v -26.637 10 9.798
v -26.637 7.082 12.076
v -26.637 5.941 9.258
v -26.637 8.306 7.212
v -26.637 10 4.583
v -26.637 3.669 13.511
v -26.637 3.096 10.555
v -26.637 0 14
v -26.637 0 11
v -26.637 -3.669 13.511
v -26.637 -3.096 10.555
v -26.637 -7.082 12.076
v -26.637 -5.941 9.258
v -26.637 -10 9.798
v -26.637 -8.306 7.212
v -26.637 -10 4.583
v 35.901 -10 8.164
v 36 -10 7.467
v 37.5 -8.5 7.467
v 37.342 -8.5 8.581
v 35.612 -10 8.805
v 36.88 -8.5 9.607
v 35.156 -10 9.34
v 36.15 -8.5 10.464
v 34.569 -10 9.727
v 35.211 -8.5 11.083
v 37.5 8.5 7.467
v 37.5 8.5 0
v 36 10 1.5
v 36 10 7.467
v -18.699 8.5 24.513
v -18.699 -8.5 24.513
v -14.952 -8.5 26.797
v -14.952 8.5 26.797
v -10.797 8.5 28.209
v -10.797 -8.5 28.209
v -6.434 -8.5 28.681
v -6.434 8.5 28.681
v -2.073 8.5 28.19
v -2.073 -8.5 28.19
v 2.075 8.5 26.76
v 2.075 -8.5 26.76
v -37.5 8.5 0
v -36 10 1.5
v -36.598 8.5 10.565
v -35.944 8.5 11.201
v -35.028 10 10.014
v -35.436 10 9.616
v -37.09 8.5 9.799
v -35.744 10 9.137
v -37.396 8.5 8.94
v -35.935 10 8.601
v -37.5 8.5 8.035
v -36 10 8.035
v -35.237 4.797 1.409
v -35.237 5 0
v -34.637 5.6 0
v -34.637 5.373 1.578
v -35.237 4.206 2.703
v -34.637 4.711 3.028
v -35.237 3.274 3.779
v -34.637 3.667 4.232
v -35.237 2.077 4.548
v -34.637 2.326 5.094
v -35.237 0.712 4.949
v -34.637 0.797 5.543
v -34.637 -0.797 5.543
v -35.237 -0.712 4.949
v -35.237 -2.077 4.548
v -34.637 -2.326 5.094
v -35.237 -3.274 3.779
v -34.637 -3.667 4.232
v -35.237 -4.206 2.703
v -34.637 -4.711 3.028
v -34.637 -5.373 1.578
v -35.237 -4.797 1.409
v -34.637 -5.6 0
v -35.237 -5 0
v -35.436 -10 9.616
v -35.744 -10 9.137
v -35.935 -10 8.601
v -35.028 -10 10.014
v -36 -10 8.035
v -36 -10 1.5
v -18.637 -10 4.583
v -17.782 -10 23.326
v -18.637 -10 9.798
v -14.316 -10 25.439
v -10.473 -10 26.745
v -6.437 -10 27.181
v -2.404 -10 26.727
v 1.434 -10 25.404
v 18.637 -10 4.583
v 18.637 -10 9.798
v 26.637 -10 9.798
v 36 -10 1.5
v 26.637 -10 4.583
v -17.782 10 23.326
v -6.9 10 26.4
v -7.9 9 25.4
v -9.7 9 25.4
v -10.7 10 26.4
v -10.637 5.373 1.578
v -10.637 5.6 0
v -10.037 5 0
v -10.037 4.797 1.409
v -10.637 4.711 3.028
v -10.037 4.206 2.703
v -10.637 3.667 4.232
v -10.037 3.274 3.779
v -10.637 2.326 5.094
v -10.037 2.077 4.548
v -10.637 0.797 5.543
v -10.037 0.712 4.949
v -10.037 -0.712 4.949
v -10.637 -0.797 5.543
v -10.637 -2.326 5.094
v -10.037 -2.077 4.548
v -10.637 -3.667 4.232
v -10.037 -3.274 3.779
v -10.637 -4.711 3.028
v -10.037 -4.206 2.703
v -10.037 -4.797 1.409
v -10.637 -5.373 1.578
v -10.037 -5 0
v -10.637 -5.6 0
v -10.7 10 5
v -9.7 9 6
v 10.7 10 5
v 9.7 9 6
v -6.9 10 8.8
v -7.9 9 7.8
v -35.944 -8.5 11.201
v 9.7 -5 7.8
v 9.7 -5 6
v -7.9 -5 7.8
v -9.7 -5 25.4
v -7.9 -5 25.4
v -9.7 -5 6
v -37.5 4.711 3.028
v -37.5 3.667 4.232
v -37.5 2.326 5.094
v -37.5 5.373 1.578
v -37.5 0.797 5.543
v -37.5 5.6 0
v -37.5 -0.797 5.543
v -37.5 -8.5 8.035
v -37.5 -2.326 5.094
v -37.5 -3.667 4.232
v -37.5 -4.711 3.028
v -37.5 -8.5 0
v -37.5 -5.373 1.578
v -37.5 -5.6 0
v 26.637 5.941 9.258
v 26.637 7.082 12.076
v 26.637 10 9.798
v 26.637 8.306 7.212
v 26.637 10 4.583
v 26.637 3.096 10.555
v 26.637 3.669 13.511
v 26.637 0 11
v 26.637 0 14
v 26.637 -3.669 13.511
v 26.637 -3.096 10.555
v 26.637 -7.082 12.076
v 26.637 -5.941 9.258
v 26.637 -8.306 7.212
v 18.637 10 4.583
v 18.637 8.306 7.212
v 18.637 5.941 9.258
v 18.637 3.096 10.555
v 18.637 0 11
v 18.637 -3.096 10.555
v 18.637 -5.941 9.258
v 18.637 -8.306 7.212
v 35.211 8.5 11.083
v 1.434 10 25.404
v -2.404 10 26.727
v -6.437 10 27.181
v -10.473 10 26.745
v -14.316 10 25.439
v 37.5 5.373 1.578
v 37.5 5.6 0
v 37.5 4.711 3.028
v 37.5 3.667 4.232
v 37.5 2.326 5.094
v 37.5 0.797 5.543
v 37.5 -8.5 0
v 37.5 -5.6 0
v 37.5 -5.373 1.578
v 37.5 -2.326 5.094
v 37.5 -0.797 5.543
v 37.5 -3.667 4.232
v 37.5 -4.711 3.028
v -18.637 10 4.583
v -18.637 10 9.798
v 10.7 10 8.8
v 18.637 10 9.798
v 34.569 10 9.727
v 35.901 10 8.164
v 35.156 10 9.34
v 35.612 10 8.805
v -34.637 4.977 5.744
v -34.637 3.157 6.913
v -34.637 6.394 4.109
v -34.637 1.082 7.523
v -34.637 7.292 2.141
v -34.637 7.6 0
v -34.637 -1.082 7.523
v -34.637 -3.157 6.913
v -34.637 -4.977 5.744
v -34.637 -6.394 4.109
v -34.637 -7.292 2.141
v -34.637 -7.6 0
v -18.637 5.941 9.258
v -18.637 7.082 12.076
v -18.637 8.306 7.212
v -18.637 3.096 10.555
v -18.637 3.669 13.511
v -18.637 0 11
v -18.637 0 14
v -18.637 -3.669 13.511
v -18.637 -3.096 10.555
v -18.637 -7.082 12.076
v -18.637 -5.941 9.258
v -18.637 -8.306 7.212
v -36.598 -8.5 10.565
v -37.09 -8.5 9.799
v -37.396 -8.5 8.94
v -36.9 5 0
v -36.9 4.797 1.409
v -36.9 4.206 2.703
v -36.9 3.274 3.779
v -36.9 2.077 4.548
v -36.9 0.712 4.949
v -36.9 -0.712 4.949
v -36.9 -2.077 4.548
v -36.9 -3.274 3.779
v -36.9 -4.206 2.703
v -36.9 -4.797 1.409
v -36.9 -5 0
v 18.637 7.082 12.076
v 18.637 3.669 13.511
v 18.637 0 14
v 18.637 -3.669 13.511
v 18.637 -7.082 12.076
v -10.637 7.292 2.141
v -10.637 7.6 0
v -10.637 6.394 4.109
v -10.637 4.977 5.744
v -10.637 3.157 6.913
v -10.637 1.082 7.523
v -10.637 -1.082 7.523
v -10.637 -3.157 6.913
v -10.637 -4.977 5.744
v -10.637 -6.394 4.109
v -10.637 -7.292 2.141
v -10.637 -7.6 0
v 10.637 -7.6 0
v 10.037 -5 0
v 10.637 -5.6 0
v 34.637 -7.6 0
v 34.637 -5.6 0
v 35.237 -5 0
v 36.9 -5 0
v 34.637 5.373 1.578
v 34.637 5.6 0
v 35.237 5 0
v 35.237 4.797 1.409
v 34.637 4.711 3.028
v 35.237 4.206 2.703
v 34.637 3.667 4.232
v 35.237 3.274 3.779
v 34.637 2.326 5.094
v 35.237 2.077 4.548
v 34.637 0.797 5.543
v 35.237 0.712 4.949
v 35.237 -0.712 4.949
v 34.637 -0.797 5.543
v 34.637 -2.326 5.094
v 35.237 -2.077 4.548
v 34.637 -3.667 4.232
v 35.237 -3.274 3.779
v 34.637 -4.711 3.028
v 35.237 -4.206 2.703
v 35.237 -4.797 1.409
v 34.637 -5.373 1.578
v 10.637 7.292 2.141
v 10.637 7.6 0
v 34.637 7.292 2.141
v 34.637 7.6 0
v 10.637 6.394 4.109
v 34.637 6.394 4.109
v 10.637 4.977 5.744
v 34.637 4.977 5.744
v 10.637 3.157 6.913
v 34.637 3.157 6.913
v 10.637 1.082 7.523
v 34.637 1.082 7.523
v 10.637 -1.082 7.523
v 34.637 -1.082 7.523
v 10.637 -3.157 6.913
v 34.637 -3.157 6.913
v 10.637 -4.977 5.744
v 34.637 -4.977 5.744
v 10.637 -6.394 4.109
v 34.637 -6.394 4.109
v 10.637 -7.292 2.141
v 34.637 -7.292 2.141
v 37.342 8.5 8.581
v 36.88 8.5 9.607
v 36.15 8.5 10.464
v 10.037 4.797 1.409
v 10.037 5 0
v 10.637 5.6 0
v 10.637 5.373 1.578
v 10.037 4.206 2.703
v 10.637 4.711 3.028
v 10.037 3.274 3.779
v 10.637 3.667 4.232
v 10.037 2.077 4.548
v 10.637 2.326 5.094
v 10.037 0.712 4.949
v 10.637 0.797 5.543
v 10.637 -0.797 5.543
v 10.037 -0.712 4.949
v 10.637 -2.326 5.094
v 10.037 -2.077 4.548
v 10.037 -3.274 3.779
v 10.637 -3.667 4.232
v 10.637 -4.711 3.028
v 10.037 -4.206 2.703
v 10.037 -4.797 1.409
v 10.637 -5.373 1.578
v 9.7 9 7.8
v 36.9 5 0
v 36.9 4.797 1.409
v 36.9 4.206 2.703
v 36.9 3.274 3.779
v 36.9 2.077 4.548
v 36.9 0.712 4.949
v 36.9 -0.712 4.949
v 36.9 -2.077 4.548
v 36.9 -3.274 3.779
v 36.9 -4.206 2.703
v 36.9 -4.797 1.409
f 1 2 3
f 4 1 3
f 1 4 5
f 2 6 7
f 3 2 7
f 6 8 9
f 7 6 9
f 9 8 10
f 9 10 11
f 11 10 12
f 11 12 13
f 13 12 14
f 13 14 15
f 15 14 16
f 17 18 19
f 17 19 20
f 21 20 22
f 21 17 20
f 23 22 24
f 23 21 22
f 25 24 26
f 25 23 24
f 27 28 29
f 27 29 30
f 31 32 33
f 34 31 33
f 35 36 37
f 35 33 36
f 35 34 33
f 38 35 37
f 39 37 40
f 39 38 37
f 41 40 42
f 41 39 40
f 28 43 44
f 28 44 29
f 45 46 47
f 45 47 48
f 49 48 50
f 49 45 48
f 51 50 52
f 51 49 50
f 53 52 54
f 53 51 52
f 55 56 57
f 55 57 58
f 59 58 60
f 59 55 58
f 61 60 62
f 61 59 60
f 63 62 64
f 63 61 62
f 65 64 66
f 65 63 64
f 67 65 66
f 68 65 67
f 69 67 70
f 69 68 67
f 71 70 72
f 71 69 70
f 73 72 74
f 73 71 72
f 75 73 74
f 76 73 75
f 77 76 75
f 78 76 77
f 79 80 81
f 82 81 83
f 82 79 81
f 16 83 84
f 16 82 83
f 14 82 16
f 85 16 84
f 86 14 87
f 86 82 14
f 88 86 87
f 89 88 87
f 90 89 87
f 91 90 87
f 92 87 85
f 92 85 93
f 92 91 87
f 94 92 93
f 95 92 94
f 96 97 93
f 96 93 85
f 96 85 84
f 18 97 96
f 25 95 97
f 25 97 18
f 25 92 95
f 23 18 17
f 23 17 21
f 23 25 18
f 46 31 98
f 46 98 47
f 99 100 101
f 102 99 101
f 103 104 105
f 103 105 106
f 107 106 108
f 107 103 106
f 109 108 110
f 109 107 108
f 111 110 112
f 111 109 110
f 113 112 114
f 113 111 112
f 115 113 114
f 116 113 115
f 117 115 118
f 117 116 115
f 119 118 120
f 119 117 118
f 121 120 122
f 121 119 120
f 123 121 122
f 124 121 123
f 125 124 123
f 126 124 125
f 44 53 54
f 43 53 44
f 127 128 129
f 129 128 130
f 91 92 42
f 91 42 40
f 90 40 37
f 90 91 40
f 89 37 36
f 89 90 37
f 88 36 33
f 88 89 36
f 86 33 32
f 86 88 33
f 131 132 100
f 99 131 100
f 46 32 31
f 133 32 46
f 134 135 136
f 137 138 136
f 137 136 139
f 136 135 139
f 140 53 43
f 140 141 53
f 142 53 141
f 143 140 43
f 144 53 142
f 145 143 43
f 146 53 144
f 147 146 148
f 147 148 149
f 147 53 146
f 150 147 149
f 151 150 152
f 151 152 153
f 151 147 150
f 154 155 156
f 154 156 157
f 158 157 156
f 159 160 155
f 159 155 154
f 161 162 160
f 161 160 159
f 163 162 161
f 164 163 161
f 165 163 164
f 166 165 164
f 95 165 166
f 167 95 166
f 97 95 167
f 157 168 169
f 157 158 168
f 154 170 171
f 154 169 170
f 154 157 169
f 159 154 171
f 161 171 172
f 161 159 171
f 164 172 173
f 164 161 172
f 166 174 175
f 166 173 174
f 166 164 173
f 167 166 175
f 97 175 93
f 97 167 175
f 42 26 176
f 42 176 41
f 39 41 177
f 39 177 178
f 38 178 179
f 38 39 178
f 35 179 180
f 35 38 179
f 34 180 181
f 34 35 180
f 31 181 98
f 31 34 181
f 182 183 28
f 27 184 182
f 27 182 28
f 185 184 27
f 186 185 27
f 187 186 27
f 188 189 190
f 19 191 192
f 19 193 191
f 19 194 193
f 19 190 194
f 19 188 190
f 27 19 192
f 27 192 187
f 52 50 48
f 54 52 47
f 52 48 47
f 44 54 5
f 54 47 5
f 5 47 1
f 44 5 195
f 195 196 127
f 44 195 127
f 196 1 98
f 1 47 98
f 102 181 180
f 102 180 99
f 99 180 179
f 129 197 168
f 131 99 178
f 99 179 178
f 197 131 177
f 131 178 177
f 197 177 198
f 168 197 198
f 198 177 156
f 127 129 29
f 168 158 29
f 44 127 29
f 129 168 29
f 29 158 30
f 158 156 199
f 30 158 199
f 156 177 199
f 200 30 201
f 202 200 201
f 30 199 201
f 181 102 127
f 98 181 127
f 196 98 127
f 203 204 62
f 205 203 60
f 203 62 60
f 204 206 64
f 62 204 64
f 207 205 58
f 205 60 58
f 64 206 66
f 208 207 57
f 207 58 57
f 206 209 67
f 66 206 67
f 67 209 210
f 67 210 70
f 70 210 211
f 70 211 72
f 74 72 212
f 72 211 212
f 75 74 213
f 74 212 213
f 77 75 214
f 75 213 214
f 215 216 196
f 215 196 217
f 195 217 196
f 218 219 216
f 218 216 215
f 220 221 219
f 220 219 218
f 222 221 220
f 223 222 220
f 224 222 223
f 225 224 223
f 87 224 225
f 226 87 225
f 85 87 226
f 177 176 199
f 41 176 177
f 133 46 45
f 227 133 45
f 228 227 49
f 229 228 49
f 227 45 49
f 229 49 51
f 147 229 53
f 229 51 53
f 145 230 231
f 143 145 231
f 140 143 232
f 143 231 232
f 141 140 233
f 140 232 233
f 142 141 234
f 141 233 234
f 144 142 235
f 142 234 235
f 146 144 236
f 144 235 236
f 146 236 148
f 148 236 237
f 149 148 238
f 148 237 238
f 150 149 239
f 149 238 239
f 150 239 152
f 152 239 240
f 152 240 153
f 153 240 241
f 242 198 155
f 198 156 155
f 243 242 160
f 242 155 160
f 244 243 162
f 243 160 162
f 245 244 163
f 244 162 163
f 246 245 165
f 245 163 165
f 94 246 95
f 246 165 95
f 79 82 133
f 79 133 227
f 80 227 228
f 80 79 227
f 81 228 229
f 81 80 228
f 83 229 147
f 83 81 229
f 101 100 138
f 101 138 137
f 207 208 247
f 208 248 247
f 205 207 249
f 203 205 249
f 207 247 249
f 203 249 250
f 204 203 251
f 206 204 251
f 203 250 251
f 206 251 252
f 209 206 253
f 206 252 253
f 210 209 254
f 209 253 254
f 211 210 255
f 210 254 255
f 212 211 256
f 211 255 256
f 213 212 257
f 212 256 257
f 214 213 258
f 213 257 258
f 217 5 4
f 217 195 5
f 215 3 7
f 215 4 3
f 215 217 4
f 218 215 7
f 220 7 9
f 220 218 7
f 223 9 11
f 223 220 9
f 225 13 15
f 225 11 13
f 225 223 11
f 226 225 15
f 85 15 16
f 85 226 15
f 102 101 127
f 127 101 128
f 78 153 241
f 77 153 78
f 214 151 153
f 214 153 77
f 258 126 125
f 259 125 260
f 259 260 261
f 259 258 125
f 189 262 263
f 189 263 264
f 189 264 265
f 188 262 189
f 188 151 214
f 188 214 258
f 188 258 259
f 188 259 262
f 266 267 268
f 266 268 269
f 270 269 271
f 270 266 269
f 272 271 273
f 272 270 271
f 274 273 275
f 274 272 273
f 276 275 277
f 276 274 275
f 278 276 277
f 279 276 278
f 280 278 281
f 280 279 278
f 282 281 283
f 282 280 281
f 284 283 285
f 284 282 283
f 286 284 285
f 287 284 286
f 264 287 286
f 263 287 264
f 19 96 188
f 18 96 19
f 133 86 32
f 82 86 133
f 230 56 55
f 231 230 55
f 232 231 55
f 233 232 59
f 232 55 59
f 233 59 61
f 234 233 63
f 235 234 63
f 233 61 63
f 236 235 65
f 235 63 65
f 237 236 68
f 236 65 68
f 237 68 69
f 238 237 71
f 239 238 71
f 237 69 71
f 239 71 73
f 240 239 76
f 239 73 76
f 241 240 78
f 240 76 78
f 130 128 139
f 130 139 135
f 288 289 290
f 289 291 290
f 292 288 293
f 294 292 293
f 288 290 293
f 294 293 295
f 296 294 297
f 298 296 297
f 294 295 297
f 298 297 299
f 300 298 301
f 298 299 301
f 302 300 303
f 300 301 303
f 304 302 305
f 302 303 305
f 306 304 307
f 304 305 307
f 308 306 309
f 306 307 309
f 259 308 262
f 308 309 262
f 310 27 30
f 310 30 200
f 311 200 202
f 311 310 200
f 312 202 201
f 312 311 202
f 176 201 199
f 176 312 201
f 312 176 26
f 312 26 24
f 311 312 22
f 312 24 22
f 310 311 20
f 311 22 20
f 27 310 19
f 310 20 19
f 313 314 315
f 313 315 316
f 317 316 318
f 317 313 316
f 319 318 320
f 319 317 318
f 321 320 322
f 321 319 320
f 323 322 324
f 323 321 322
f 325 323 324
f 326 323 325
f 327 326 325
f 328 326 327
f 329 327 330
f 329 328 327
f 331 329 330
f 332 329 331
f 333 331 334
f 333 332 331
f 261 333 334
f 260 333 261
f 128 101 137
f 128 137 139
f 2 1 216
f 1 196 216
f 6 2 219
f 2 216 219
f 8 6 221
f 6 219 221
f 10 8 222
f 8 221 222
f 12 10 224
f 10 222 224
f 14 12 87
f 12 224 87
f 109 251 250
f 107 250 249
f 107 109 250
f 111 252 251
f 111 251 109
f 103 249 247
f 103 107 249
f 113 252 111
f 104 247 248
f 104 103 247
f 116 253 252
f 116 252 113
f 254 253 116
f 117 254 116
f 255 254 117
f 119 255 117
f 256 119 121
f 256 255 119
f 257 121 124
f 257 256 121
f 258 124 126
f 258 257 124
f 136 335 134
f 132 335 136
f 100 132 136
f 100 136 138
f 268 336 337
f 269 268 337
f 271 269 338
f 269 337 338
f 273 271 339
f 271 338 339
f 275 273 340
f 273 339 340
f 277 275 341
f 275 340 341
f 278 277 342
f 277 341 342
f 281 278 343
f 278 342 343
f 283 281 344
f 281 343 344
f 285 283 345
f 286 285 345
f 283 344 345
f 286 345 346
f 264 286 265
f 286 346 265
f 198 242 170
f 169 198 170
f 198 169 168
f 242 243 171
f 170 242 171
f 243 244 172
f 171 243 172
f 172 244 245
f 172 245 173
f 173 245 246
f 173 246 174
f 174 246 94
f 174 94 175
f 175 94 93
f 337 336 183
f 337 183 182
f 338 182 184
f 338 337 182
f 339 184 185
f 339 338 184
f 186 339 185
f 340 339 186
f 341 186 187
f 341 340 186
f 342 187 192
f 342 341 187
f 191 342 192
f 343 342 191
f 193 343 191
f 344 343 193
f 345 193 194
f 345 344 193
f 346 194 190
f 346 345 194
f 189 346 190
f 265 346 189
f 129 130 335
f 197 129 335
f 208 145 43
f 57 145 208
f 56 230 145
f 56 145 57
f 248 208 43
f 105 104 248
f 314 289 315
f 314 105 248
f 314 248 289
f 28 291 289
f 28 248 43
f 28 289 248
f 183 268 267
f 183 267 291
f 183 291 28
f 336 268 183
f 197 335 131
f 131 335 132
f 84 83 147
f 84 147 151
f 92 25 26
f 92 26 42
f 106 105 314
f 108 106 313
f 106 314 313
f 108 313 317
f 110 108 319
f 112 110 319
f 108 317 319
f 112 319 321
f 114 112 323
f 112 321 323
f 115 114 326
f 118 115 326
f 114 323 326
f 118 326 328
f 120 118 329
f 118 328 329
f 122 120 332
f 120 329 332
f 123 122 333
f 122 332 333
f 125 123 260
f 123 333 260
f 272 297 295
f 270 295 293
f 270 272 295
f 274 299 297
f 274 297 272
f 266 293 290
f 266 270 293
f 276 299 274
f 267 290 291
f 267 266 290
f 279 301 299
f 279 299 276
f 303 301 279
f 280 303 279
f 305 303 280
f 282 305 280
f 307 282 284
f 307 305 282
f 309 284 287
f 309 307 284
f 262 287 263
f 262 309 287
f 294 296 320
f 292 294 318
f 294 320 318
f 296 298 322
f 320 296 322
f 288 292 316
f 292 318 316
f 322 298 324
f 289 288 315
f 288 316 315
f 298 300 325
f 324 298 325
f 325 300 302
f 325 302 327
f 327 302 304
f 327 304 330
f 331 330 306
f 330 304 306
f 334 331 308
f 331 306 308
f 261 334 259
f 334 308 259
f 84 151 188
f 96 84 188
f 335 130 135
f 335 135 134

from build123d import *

# Parameters (mm, degrees)
PAD_DEPTH       = 10
SKETCH001_R     = 5
POCKET_DEPTH    = 75.001
POCKET001_DEPTH = 15
SKETCH003_W     = 24
SKETCH003_H     = 7.6
SKETCH003_W_2   = 8
SKETCH003_H_2   = 3
CHAMFER_SIZE    = 0.6
FILLET_R        = 20
FILLET001_R     = 4
CHAMFER001_SIZE = 1.5
CHAMFER002_SIZE = 1


with BuildPart() as part:
    # Sketch → Pad (new body, symmetric)
    with BuildSketch(Plane.XZ):
        Polygon((-37.5, 0), (37.5, 0), (37.5, 10), (-9, 32), (-37.5, 10), align=None)
    extrude(amount=PAD_DEPTH, both=True)

    # Sketch001 (on Face2 of Pad) → Pocket (cut, through all)
    with BuildSketch(Plane(origin=(37.5, 0, 0), x_dir=(0, 0, 1), z_dir=(1, 0, 0))):
        Circle(SKETCH001_R)
    extrude(amount=-POCKET_DEPTH, mode=Mode.SUBTRACT)

    # Sketch002 (on Face2 of Pocket) → Pocket001 (cut)
    with BuildSketch(Plane(origin=(0, 10, 0), x_dir=(1, 0, 0), z_dir=(0, 1, 0))):
        Polygon((-9.7, -25.4), (-9.7, -6), (9.7, -6), (9.7, -7.8), (-7.9, -7.8), (-7.9, -25.4), align=None)
    extrude(amount=-POCKET001_DEPTH, mode=Mode.SUBTRACT)

    # Sketch003 → Groove (revolve, cut)
    with BuildSketch(Plane.XZ):
        with Locations((-22.636851, 3.8)):
            Rectangle(SKETCH003_W, SKETCH003_H)
        with Locations((22.636851, 3.8)):
            Rectangle(SKETCH003_W, SKETCH003_H)
        with Locations((-22.636851, 12.5)):
            Rectangle(SKETCH003_W_2, SKETCH003_H_2)
        with Locations((22.636851, 12.5)):
            Rectangle(SKETCH003_W_2, SKETCH003_H_2)
    revolve(axis=Axis((0, 0, 0), (1, 0, 0)), mode=Mode.SUBTRACT)

    # Chamfer
    chamfer_edges = [part.edges().sort_by_distance(p)[0] for p in [
        (37.5, 3.535534, 3.535534),
        (34.636851, 0, 5),
        (10.636851, 0, 5),
        (-10.636851, 0, 5),
        (-34.636851, 0, 5),
        (-37.5, 3.535534, 3.535534),
    ]]
    chamfer(chamfer_edges, length=CHAMFER_SIZE)

    # Fillet
    fillet_edges = [part.edges().sort_by_distance(p)[0] for p in [
        (-9, 0, 32),
    ]]
    fillet(fillet_edges, radius=FILLET_R)

    # Fillet001
    fillet001_edges = [part.edges().sort_by_distance(p)[0] for p in [
        (37.5, 0, 10),
        (-37.5, 0, 10),
    ]]
    fillet(fillet001_edges, radius=FILLET001_R)

    # Chamfer001
    chamfer001_edges = [part.edges().sort_by_distance(p)[0] for p in [
        (18.643068, 10, 18.921559),
        (0, 10, 0),
        (18.643068, -10, 18.921559),
        (0, -10, 0),
    ]]
    chamfer(chamfer001_edges, length=CHAMFER001_SIZE)

    # Chamfer002
    chamfer002_edges = [part.edges().sort_by_distance(p)[0] for p in [
        (-9.7, 10, 15.7),
        (-7.9, 10, 16.6),
        (-8.8, 10, 25.4),
        (0, 10, 6),
        (0.9, 10, 7.8),
        (9.7, 10, 6.9),
    ]]
    chamfer(chamfer002_edges, length=CHAMFER002_SIZE)


solid = part.part
